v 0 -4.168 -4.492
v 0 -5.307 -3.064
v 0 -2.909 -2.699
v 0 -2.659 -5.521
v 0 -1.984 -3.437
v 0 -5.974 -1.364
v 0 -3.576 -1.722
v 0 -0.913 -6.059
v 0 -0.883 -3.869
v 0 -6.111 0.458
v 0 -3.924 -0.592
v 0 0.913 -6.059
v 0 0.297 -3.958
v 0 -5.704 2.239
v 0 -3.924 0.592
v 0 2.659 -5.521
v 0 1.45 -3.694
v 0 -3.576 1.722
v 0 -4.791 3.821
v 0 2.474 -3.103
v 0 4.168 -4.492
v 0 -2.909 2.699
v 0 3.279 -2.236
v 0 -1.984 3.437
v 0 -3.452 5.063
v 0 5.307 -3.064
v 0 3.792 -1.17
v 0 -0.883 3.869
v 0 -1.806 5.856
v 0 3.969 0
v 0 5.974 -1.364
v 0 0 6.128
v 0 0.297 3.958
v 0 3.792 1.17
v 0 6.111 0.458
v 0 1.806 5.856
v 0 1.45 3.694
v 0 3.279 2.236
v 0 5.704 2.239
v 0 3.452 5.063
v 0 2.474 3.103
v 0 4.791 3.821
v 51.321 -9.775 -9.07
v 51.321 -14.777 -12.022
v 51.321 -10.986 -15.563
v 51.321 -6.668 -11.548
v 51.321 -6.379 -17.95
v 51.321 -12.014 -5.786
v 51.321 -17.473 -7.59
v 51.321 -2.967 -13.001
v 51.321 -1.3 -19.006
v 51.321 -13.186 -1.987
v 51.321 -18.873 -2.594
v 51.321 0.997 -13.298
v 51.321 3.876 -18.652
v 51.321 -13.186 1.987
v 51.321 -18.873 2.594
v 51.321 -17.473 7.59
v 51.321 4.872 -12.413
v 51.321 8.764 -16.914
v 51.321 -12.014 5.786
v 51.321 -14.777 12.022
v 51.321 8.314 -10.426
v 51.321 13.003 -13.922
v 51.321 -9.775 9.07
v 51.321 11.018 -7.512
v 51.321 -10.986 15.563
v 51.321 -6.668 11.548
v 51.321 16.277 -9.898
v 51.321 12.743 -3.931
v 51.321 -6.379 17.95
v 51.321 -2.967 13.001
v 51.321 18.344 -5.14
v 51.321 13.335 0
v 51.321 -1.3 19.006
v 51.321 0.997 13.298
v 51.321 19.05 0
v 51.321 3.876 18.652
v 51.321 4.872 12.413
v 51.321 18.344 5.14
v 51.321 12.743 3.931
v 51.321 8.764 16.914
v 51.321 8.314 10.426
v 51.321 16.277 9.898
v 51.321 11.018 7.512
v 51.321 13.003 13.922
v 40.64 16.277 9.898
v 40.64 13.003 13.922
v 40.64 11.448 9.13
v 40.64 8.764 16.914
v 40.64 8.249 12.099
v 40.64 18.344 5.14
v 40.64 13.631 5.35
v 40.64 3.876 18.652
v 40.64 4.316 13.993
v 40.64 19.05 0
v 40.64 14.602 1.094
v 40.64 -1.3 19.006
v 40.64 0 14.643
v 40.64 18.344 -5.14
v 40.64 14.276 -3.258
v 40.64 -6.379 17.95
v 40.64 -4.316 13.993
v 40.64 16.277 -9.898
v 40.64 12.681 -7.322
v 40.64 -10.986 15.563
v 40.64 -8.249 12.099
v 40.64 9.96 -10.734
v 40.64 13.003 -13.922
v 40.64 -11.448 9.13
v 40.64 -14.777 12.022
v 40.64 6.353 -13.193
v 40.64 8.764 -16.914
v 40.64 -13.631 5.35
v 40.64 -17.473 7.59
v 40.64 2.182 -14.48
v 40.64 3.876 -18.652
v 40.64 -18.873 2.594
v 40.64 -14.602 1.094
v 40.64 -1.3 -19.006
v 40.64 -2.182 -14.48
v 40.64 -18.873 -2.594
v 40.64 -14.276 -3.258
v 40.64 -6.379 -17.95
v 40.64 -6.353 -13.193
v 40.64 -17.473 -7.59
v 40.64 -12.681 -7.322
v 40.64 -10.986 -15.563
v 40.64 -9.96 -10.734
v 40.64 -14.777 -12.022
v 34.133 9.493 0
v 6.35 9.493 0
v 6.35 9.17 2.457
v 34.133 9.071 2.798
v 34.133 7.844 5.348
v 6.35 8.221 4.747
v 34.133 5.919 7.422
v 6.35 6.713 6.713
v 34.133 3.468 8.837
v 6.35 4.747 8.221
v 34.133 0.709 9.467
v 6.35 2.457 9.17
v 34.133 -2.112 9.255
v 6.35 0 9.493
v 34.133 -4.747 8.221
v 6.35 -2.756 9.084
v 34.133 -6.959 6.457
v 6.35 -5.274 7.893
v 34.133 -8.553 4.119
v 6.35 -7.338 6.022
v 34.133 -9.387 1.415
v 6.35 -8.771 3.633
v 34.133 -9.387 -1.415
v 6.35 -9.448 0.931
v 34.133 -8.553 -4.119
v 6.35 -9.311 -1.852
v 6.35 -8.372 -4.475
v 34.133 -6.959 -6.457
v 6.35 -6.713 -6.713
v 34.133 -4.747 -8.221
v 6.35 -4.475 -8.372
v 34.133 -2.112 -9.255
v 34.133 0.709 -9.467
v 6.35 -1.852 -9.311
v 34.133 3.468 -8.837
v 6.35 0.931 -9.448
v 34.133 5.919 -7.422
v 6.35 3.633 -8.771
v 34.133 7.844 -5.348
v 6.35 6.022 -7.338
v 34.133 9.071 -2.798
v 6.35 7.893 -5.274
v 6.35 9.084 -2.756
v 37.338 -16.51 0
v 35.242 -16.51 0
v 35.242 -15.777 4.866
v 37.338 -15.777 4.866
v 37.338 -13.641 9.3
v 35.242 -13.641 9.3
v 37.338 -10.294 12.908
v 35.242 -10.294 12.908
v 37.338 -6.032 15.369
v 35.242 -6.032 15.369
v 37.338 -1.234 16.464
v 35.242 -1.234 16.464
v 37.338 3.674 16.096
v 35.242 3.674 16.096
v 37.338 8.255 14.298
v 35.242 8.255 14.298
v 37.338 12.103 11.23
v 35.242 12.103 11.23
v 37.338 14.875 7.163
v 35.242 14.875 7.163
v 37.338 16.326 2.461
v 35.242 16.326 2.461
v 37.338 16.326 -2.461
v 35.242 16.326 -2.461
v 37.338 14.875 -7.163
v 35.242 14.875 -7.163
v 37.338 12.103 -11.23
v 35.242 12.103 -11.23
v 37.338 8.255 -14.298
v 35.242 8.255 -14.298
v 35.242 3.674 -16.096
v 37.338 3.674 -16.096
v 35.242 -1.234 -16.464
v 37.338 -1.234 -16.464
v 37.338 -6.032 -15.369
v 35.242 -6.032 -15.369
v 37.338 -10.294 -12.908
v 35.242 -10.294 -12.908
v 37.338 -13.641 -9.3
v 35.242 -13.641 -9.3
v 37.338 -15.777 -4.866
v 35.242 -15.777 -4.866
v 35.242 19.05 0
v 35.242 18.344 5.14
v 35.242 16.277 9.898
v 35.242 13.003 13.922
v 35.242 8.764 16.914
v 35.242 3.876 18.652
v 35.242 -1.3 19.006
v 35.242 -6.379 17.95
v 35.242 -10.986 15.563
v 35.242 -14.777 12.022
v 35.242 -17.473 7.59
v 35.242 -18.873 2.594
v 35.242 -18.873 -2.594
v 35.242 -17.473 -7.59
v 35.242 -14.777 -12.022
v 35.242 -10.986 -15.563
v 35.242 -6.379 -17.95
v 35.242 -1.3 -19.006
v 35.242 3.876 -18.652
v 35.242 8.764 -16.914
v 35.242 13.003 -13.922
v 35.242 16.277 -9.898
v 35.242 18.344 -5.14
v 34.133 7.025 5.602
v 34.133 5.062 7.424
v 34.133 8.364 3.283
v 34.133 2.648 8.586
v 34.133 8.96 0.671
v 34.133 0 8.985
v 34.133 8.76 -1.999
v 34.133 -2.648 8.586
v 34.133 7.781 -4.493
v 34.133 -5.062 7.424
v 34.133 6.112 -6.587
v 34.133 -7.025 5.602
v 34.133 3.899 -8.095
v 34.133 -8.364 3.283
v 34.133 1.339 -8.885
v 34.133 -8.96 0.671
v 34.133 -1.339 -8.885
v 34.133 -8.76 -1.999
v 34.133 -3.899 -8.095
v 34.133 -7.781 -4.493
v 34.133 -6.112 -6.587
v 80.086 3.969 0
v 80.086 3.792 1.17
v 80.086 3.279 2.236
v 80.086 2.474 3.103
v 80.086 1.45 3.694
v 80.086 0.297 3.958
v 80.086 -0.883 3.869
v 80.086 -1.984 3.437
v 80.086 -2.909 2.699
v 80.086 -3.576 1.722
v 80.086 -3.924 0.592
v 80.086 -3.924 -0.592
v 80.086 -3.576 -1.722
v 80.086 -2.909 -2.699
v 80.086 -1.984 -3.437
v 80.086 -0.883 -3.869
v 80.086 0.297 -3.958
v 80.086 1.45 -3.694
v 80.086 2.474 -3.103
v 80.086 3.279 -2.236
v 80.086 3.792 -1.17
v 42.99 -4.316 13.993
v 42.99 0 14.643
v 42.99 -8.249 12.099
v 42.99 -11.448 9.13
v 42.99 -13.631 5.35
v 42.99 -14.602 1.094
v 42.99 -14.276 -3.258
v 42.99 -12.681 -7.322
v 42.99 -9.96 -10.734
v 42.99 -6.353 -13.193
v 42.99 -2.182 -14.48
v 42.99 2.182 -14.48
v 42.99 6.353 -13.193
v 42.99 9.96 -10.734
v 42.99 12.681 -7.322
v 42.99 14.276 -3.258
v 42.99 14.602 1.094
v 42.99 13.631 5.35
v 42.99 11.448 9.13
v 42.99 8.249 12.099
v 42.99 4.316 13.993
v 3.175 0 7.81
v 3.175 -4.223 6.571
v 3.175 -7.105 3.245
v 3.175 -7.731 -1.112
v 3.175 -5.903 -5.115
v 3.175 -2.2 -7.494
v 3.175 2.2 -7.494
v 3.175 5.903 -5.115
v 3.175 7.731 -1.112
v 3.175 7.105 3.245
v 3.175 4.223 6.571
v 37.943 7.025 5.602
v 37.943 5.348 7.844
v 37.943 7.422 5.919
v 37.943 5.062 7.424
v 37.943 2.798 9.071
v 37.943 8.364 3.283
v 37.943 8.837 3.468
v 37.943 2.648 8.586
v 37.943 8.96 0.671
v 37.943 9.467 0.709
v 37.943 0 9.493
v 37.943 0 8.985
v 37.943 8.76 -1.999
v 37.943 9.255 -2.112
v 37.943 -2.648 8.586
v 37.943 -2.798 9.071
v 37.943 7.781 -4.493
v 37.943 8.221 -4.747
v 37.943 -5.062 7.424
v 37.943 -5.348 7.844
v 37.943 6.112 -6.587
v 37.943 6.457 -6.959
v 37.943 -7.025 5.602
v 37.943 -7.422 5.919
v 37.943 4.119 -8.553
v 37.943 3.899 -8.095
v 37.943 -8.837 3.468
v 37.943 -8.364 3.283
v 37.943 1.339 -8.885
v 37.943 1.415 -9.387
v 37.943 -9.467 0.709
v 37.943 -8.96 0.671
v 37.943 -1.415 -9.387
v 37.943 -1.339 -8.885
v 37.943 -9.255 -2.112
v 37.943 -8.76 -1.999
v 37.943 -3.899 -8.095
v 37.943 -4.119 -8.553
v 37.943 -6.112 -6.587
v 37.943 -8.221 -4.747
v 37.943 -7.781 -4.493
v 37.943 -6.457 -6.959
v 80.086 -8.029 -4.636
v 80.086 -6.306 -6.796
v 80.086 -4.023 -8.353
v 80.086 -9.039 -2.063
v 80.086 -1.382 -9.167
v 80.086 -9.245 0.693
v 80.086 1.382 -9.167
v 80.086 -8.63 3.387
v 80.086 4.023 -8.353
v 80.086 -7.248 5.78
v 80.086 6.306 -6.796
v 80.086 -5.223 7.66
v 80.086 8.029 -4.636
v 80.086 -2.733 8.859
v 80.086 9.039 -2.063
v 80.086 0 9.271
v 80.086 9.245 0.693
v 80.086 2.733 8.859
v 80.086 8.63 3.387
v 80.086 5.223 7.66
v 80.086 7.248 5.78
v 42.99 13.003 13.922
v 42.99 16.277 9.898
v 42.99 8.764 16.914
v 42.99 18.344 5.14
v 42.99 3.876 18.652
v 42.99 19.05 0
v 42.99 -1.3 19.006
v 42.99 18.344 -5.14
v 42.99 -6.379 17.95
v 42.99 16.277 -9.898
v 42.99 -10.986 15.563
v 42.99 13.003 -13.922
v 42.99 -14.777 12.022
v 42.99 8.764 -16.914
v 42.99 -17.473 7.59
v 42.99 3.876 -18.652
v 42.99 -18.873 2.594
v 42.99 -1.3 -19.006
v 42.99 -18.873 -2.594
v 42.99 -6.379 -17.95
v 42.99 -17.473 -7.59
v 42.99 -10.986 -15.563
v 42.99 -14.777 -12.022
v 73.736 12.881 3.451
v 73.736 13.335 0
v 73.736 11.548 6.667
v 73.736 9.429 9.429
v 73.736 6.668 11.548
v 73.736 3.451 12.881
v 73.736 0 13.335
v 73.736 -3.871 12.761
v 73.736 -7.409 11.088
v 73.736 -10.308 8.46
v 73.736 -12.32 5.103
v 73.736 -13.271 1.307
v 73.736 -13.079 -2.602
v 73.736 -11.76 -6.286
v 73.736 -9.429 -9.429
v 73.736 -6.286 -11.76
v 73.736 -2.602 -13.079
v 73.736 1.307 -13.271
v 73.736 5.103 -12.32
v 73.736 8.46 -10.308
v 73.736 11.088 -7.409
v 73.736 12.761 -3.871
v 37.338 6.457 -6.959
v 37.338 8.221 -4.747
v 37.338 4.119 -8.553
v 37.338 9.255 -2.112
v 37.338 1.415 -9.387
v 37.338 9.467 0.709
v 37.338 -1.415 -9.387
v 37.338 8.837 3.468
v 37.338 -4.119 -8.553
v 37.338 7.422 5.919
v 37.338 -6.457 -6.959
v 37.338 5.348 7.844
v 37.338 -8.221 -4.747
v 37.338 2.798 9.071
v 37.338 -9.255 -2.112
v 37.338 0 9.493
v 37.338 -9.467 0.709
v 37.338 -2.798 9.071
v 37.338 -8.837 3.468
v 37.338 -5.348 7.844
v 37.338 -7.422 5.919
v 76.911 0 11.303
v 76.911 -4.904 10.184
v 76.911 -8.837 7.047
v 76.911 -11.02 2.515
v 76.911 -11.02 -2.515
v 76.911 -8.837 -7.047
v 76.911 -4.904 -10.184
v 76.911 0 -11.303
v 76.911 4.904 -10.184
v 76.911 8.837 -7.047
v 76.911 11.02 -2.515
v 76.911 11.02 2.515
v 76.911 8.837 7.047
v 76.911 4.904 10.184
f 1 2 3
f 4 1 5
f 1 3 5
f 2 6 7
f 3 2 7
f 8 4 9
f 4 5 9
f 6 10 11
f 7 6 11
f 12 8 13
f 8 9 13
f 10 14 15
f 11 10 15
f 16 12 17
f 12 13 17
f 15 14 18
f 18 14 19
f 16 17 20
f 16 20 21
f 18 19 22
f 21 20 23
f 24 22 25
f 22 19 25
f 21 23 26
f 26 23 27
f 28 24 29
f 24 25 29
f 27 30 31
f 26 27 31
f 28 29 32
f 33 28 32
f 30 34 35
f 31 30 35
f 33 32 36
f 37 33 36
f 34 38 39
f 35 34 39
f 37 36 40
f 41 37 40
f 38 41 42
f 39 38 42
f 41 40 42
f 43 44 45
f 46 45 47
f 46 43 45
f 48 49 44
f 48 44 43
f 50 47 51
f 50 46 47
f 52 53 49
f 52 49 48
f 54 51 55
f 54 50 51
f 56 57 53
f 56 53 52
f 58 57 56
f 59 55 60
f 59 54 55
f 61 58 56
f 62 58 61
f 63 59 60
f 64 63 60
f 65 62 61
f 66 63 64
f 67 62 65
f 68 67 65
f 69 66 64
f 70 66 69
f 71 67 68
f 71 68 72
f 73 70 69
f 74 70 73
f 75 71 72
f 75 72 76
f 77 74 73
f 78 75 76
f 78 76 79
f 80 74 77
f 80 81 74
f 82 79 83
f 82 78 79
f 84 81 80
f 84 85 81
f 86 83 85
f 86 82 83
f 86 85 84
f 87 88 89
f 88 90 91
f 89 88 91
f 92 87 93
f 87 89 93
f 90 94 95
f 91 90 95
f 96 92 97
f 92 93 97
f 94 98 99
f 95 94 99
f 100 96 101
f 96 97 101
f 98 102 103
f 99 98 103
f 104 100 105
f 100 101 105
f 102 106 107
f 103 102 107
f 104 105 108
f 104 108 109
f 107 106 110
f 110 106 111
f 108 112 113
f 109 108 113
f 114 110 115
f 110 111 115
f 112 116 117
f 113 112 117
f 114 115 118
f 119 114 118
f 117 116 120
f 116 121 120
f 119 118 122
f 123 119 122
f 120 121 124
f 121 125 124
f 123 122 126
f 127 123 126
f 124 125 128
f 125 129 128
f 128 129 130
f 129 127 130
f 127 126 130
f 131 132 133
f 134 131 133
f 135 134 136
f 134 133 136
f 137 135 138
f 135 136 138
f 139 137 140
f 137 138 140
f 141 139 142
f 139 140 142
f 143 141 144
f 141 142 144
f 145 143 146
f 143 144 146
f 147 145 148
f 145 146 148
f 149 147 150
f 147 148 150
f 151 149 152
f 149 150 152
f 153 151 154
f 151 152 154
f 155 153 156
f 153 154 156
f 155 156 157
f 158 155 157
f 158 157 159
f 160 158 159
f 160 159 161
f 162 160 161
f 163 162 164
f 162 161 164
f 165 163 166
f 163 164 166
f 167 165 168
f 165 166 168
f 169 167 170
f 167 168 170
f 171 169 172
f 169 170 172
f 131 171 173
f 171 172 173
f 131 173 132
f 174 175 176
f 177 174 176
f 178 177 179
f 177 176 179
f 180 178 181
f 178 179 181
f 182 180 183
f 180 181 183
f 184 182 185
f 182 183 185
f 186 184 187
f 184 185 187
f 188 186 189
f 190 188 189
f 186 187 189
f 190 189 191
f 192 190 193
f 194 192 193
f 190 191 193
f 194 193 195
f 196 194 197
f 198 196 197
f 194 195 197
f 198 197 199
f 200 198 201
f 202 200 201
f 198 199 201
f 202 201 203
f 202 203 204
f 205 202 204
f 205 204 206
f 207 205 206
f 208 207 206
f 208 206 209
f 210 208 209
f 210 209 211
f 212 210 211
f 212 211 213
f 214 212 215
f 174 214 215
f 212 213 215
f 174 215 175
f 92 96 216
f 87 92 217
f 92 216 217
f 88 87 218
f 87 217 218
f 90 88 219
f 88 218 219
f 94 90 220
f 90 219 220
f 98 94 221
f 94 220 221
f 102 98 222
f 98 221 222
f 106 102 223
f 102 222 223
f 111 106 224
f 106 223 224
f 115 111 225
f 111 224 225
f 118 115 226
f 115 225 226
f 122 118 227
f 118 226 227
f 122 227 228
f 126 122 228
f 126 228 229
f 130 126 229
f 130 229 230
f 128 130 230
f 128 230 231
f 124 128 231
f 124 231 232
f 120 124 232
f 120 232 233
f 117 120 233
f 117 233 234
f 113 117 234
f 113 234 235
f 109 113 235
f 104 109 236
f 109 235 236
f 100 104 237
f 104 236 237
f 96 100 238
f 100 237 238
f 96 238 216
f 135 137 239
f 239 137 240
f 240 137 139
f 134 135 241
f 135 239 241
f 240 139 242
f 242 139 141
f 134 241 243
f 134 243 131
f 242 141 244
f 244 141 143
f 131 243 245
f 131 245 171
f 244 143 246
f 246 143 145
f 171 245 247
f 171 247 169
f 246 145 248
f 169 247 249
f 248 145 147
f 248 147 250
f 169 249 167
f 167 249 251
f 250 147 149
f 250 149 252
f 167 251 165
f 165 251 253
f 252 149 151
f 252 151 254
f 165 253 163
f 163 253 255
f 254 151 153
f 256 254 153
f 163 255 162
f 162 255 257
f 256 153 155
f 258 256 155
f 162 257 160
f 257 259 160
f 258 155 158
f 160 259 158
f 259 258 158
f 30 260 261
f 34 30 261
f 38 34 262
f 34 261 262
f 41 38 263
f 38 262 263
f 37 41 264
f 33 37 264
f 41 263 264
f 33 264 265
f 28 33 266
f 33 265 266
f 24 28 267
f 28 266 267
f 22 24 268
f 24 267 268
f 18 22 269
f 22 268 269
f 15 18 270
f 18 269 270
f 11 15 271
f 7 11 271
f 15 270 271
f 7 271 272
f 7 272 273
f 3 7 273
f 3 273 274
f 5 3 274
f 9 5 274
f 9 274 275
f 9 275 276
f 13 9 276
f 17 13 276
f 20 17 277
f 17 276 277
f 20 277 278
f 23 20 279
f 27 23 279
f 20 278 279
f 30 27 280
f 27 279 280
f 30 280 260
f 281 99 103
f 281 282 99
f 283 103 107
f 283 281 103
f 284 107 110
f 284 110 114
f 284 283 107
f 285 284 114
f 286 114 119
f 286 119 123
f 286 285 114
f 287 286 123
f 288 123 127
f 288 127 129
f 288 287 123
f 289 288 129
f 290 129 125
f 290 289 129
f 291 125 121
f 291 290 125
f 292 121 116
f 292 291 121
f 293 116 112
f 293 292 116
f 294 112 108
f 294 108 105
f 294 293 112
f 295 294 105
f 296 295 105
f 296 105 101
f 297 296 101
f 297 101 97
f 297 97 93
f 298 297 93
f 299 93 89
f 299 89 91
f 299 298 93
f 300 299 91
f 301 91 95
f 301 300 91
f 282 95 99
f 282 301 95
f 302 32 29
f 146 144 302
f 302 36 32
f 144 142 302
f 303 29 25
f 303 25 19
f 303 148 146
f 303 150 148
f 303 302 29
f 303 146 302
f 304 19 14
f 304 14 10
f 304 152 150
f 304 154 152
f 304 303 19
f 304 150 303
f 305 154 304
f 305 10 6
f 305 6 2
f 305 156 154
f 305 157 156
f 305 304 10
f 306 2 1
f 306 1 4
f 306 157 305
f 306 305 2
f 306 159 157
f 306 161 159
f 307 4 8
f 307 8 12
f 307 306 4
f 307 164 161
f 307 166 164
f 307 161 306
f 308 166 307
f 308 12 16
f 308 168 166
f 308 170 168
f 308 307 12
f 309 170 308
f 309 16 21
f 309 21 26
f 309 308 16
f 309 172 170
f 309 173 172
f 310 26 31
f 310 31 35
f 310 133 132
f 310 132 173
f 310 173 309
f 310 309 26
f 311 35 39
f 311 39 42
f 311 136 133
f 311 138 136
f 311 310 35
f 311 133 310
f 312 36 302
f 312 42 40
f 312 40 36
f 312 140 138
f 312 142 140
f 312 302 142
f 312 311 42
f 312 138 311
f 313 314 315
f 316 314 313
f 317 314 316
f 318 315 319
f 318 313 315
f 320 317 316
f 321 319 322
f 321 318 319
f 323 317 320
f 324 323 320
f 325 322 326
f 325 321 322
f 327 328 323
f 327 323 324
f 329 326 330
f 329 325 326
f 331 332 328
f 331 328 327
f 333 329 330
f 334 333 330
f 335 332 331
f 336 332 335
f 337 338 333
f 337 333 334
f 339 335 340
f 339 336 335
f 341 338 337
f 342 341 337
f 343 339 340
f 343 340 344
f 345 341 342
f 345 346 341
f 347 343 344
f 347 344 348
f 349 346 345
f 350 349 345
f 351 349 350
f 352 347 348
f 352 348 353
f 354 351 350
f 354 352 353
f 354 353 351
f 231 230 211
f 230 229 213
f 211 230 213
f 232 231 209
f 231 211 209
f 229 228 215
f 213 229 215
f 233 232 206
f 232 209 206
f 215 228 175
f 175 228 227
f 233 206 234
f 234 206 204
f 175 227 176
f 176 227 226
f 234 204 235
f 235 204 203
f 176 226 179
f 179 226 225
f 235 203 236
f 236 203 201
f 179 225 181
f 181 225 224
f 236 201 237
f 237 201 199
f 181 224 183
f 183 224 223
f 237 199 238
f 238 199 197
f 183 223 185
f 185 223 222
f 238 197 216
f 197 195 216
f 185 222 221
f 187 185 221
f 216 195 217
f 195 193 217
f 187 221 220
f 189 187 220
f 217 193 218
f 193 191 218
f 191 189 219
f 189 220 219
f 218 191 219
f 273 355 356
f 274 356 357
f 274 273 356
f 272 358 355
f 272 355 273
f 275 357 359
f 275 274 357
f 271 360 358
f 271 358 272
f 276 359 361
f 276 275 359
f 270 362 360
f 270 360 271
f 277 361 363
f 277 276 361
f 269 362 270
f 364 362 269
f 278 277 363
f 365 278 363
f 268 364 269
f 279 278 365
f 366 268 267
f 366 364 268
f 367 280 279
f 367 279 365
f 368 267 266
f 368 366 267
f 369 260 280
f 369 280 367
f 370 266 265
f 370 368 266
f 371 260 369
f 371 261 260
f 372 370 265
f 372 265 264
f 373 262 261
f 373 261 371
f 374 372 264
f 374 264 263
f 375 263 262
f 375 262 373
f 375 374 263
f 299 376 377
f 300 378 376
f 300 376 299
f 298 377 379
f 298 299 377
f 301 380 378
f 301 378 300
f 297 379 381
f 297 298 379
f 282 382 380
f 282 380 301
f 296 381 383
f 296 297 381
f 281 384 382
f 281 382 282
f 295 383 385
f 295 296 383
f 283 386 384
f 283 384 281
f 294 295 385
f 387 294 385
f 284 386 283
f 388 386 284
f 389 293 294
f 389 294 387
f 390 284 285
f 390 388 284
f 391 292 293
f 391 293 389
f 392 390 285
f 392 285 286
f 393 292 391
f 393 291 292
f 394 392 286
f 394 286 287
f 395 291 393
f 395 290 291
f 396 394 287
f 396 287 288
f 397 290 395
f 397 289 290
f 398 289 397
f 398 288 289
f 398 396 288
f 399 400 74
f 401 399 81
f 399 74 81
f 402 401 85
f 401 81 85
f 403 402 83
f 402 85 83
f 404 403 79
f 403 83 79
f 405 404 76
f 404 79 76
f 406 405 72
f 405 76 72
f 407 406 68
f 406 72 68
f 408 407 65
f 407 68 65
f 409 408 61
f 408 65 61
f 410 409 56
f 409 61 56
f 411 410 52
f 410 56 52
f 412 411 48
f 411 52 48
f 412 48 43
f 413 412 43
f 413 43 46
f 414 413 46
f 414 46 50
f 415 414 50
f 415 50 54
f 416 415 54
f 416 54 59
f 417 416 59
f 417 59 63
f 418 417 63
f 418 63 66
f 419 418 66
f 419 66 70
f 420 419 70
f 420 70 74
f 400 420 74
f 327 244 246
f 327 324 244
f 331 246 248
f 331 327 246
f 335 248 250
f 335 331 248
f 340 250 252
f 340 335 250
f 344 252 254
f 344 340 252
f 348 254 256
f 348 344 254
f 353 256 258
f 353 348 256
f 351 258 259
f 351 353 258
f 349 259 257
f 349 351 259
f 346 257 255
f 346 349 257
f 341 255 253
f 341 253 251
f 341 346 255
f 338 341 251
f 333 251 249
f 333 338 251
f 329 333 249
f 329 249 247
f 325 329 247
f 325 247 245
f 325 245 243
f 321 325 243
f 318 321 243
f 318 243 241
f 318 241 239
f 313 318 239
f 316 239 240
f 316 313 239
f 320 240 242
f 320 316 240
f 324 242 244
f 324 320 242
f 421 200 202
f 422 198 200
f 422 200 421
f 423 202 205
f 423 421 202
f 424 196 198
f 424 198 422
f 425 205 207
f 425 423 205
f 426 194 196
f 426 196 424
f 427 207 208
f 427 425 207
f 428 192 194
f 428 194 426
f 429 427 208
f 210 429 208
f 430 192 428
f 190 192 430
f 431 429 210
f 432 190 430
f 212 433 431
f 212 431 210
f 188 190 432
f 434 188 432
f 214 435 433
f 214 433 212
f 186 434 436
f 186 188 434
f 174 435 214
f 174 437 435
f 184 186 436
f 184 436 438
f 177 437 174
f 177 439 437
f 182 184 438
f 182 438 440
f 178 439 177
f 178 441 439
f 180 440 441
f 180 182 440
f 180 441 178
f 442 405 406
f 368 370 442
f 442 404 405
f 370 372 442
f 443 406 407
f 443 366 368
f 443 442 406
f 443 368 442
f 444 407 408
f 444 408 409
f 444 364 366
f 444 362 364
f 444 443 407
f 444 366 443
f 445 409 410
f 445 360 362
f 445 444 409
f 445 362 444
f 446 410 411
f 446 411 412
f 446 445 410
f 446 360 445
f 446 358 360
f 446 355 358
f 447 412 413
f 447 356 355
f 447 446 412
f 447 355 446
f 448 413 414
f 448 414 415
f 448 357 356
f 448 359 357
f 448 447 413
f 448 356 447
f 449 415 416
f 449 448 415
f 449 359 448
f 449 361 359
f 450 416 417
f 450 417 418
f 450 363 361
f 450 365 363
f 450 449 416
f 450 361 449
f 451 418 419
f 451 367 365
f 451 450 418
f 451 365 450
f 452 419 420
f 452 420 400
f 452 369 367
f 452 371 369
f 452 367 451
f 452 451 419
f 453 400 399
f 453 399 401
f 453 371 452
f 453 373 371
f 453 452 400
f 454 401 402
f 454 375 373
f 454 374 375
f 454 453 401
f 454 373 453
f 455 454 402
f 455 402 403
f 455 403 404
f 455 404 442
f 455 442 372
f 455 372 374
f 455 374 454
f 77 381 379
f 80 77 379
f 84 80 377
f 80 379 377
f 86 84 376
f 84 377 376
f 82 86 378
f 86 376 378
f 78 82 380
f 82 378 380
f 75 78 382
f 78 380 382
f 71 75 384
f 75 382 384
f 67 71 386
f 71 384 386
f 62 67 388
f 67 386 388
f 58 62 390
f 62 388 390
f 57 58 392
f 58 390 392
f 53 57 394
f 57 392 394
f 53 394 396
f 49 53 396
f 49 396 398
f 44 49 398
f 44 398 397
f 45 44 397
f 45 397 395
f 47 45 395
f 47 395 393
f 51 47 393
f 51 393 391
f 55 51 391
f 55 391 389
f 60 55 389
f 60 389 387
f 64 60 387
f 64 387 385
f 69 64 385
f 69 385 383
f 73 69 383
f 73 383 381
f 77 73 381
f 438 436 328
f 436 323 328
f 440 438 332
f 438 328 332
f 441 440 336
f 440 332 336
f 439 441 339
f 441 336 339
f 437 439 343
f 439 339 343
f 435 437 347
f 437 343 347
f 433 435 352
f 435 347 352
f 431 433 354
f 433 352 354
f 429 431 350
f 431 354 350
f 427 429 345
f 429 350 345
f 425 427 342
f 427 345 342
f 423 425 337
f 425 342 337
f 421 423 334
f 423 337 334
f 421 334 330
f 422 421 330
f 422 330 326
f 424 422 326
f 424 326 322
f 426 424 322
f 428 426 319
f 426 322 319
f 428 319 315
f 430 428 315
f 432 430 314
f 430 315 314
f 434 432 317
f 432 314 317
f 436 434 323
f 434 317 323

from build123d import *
from build123d import SkipClean  # not in build123d's __all__

# Parameters (mm, degrees)
F0_R     = 9.49325
F1_DEPTH = 35.2425
F2_R     = 19.05
F3_DEPTH = 16.0782
F4_R     = 13.335
F5_DEPTH = 28.7655
F6_R     = 3.96875
F7_DEPTH = 80.0862
F8_R     = 16.51
F8_R_2   = 9.49325
F9_DEPTH = 2.0955
F10_W    = 3.81
F10_H    = 0.508
F12_W    = 2.3495
F12_H    = 4.4069


with BuildPart() as f1:
    # F0 (on Right) → F1 (new body)
    with BuildSketch(Plane.YZ):
        Circle(F0_R)
    extrude(amount=F1_DEPTH)

    # F2 (on face) → F3 (join)
    with BuildSketch(Plane.YZ.offset(35.2425)):
        Circle(F2_R)
    extrude(amount=F3_DEPTH)

    # F4 (on face) → F5 (join)
    with BuildSketch(Plane.YZ.offset(51.3207)):
        Circle(F4_R)
    extrude(amount=F5_DEPTH)

    # F6 (on face) → F7 (cut, through all)
    with BuildSketch(Plane.YZ.offset(80.0862)):
        Circle(F6_R)
    extrude(amount=-F7_DEPTH, mode=Mode.SUBTRACT)

    # F8 (on face) → F9 (cut)
    with BuildSketch(Plane(origin=(35.2425, 0, 0), x_dir=(0, -1, 0), z_dir=(-1, 0, 0))):
        Circle(F8_R)
        Circle(F8_R_2, mode=Mode.SUBTRACT)
    with SkipClean():  # cleaning this boolean's faces spoils the solid; the shape is the same uncleaned
        extrude(amount=-F9_DEPTH, mode=Mode.SUBTRACT)

    # F10 (on Front) → F11 (revolve, cut)
    with BuildSketch(Plane.XZ):
        with Locations((36.0383225369, 9.23925)):
            Rectangle(F10_W, F10_H)
    revolve(axis=Axis((43.7559969723, 0, 0), (1, 0, 0)), mode=Mode.SUBTRACT)

    # F12 (on Front) → F13 (revolve, cut)
    with BuildSketch(Plane.XZ):
        with Locations((41.81475, 16.84655)):
            Rectangle(F12_W, F12_H)
    revolve(axis=Axis((42.9936237633, 0, 0), (1, 0, 0)), mode=Mode.SUBTRACT)

    # F14 (on Front) → F15 (revolve, cut)
    with BuildSketch(Plane.XZ):
        Polygon((6.35, 9.49325), (0, 9.49325), (0, 6.12775), align=None)
        Polygon((80.0862, 13.335), (73.7362, 13.335), (80.0862, 9.271), align=None)
    revolve(axis=Axis((41.732724756, 0, 0), (1, 0, 0)), mode=Mode.SUBTRACT)


solid = f1.part
